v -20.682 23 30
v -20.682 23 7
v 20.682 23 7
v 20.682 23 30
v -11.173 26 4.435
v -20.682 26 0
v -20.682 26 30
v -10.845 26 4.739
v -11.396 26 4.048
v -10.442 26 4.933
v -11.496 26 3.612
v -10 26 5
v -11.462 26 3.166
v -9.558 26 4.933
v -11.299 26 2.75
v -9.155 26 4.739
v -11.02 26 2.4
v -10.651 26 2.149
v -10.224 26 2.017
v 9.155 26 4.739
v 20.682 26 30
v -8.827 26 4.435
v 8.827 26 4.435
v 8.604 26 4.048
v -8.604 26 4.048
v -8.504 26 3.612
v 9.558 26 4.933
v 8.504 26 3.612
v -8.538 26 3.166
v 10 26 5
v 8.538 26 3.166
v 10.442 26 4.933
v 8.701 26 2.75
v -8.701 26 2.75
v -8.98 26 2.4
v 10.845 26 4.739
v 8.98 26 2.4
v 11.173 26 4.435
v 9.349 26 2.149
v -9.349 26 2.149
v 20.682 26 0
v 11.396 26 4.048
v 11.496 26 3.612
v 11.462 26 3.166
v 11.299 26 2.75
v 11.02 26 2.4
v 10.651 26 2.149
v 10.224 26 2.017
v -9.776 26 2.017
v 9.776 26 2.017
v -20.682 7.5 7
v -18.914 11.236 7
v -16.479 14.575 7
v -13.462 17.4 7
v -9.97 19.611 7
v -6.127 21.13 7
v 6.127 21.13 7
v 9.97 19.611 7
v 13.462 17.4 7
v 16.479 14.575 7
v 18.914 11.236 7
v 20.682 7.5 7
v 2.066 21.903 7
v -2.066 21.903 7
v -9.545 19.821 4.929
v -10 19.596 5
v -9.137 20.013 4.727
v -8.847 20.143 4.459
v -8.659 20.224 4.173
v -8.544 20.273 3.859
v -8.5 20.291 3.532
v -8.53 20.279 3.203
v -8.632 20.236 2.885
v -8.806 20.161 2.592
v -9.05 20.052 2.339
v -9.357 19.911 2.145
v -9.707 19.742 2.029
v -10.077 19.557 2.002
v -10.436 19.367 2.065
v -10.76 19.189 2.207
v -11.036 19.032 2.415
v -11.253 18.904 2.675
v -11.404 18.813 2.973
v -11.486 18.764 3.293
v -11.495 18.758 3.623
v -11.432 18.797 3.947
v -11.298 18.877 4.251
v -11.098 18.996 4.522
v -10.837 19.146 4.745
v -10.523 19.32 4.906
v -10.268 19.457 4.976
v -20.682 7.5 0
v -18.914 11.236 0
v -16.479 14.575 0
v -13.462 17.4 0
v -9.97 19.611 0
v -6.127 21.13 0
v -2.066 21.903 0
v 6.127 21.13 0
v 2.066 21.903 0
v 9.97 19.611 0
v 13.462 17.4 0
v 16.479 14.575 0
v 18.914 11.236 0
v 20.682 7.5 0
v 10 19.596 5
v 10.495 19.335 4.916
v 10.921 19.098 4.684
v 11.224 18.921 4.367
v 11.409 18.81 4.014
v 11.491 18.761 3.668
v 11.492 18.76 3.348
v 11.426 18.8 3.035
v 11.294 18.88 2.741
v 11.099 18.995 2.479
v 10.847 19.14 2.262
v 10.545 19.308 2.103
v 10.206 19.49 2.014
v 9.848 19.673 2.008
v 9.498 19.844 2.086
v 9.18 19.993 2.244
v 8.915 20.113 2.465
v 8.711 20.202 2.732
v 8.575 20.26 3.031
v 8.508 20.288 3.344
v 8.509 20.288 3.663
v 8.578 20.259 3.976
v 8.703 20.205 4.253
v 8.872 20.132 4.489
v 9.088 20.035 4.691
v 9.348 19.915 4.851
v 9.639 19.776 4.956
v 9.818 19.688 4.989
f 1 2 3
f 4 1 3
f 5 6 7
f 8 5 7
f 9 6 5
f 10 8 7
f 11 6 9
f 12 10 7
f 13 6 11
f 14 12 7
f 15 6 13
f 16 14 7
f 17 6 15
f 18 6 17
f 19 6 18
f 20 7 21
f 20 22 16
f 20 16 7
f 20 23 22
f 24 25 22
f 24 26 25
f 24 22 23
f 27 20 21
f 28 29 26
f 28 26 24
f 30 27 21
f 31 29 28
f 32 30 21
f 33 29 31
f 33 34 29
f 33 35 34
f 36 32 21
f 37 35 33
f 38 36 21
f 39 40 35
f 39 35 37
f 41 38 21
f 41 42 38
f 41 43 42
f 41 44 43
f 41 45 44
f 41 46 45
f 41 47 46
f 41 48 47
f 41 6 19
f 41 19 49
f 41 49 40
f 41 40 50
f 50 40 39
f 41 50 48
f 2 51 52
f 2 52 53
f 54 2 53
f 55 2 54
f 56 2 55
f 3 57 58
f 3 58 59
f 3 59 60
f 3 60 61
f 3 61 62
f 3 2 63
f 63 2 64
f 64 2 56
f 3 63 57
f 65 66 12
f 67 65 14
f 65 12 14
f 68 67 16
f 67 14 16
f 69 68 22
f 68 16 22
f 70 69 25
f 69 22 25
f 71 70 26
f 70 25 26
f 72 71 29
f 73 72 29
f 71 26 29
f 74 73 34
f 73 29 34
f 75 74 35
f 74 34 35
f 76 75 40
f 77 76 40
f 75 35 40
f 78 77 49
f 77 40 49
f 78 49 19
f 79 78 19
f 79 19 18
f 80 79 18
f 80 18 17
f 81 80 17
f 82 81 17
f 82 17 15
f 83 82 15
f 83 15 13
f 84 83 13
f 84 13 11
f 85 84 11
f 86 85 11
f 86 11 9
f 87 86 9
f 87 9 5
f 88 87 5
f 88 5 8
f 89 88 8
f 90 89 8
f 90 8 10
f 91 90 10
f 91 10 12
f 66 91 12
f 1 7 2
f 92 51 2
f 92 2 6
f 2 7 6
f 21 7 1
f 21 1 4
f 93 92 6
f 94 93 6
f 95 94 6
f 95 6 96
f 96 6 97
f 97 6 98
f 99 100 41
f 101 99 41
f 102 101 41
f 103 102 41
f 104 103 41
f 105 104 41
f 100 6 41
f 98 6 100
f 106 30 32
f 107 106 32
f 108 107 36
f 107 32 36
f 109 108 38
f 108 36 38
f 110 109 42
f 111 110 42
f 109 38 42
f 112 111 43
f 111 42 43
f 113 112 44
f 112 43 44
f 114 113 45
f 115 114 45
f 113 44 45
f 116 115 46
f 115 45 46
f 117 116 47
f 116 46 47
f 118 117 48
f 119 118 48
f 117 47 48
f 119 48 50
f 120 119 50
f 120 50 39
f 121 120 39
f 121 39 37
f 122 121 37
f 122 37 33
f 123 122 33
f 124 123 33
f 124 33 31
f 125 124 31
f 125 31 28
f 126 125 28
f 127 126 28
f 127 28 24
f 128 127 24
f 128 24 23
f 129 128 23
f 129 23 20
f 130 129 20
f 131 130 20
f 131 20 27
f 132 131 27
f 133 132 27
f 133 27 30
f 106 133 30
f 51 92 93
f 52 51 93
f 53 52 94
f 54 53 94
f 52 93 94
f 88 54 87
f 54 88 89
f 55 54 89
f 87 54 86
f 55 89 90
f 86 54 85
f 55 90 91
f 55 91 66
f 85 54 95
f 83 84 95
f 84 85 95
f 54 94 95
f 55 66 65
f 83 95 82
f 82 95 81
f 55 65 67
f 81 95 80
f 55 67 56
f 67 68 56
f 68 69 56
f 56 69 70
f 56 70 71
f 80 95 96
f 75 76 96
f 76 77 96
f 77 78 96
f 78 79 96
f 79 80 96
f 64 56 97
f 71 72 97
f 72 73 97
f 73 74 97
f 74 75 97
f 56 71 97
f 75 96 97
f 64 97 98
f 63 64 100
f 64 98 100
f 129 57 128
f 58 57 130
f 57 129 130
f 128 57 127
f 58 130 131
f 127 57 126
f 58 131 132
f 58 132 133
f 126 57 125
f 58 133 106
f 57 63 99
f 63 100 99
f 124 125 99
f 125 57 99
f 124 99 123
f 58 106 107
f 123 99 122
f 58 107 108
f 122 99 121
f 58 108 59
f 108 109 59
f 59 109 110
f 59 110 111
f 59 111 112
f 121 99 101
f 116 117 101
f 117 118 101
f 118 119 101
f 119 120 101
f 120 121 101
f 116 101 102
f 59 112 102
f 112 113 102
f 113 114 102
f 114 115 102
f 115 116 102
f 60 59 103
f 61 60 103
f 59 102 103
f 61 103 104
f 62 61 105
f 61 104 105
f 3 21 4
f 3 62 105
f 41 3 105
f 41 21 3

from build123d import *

# Parameters (mm, degrees)
SKETCH1_R           = 22
BOSS_EXTRUDE1_DEPTH = 7
SKETCH2_W           = 41.36423576
SKETCH2_H           = 15
BOSS_EXTRUDE2_DEPTH = 23
BOSS_EXTRUDE3_DEPTH = 7
SKETCH4_W           = 41.36423576
SKETCH4_H           = 23
BOSS_EXTRUDE4_DEPTH = 3
SKETCH5_R           = 1.5
CUT_EXTRUDE1_DEPTH  = 61.728905803
SKETCH6_R           = 22
CUT_EXTRUDE2_DEPTH  = 46.387222977


with BuildPart() as part:
    # Sketch1 → Boss-Extrude1 (new body)
    with BuildSketch(Plane.XY):
        Circle(SKETCH1_R)
    extrude(amount=BOSS_EXTRUDE1_DEPTH)

    # Sketch2 → Boss-Extrude2 (add)
    with BuildSketch(Plane.XY.offset(7)):
        Rectangle(SKETCH2_W, SKETCH2_H)
    extrude(amount=BOSS_EXTRUDE2_DEPTH)


with BuildPart() as body_2:
    # Sketch3 → Boss-Extrude3 (new body)
    with BuildSketch(Plane(origin=(0, 0, 0), x_dir=(-1, 0, 0), z_dir=(0, 0, -1))):
        with BuildLine():
            Line((-20.68211788, 7.5), (-20.68211788, 26))
            Line((-20.68211788, 26), (20.68211788, 26))
            Line((20.68211788, 26), (20.68211788, 7.5))
            ThreePointArc((20.68211788, 7.5), (0, 22), (-20.68211788, 7.5))
        make_face()
    extrude(amount=-BOSS_EXTRUDE3_DEPTH)

    # Sketch4 → Boss-Extrude4 (add)
    with BuildSketch(Plane(origin=(0, 26, 0), x_dir=(1, 0, 0), z_dir=(0, 1, 0))):
        with Locations((0, -18.5)):
            Rectangle(SKETCH4_W, SKETCH4_H)
    extrude(amount=-BOSS_EXTRUDE4_DEPTH)


with BuildPart() as cut_extrude1_tool:
    # Sketch5 → Cut-Extrude1 (new, through all)
    with BuildSketch(Plane(origin=(0, 26, 0), x_dir=(1, 0, 0), z_dir=(0, 1, 0))):
        with Locations(Location((-10, -3.5, 0), (0, 0, 270))):
            Circle(SKETCH5_R)
        with Locations(Location((10, -3.5, 0), (0, 0, 270))):
            Circle(SKETCH5_R)
    extrude(amount=-CUT_EXTRUDE1_DEPTH)


with BuildPart() as part_1:
    add(part.part)

    # Cut-Extrude1: cut by cut_extrude1_tool
    add(cut_extrude1_tool.part, mode=Mode.SUBTRACT)

    # Sketch6 → Cut-Extrude2 (cut, through all)
    with BuildSketch(Plane(origin=(0, 0, 0), x_dir=(-1, 0, 0), z_dir=(0, 0, -1))):
        Circle(SKETCH6_R)
    extrude(amount=-CUT_EXTRUDE2_DEPTH, mode=Mode.SUBTRACT)


with BuildPart() as body_2_1:
    add(body_2.part)

    # Cut-Extrude1: cut by cut_extrude1_tool
    add(cut_extrude1_tool.part, mode=Mode.SUBTRACT)


solid = body_2_1.part
